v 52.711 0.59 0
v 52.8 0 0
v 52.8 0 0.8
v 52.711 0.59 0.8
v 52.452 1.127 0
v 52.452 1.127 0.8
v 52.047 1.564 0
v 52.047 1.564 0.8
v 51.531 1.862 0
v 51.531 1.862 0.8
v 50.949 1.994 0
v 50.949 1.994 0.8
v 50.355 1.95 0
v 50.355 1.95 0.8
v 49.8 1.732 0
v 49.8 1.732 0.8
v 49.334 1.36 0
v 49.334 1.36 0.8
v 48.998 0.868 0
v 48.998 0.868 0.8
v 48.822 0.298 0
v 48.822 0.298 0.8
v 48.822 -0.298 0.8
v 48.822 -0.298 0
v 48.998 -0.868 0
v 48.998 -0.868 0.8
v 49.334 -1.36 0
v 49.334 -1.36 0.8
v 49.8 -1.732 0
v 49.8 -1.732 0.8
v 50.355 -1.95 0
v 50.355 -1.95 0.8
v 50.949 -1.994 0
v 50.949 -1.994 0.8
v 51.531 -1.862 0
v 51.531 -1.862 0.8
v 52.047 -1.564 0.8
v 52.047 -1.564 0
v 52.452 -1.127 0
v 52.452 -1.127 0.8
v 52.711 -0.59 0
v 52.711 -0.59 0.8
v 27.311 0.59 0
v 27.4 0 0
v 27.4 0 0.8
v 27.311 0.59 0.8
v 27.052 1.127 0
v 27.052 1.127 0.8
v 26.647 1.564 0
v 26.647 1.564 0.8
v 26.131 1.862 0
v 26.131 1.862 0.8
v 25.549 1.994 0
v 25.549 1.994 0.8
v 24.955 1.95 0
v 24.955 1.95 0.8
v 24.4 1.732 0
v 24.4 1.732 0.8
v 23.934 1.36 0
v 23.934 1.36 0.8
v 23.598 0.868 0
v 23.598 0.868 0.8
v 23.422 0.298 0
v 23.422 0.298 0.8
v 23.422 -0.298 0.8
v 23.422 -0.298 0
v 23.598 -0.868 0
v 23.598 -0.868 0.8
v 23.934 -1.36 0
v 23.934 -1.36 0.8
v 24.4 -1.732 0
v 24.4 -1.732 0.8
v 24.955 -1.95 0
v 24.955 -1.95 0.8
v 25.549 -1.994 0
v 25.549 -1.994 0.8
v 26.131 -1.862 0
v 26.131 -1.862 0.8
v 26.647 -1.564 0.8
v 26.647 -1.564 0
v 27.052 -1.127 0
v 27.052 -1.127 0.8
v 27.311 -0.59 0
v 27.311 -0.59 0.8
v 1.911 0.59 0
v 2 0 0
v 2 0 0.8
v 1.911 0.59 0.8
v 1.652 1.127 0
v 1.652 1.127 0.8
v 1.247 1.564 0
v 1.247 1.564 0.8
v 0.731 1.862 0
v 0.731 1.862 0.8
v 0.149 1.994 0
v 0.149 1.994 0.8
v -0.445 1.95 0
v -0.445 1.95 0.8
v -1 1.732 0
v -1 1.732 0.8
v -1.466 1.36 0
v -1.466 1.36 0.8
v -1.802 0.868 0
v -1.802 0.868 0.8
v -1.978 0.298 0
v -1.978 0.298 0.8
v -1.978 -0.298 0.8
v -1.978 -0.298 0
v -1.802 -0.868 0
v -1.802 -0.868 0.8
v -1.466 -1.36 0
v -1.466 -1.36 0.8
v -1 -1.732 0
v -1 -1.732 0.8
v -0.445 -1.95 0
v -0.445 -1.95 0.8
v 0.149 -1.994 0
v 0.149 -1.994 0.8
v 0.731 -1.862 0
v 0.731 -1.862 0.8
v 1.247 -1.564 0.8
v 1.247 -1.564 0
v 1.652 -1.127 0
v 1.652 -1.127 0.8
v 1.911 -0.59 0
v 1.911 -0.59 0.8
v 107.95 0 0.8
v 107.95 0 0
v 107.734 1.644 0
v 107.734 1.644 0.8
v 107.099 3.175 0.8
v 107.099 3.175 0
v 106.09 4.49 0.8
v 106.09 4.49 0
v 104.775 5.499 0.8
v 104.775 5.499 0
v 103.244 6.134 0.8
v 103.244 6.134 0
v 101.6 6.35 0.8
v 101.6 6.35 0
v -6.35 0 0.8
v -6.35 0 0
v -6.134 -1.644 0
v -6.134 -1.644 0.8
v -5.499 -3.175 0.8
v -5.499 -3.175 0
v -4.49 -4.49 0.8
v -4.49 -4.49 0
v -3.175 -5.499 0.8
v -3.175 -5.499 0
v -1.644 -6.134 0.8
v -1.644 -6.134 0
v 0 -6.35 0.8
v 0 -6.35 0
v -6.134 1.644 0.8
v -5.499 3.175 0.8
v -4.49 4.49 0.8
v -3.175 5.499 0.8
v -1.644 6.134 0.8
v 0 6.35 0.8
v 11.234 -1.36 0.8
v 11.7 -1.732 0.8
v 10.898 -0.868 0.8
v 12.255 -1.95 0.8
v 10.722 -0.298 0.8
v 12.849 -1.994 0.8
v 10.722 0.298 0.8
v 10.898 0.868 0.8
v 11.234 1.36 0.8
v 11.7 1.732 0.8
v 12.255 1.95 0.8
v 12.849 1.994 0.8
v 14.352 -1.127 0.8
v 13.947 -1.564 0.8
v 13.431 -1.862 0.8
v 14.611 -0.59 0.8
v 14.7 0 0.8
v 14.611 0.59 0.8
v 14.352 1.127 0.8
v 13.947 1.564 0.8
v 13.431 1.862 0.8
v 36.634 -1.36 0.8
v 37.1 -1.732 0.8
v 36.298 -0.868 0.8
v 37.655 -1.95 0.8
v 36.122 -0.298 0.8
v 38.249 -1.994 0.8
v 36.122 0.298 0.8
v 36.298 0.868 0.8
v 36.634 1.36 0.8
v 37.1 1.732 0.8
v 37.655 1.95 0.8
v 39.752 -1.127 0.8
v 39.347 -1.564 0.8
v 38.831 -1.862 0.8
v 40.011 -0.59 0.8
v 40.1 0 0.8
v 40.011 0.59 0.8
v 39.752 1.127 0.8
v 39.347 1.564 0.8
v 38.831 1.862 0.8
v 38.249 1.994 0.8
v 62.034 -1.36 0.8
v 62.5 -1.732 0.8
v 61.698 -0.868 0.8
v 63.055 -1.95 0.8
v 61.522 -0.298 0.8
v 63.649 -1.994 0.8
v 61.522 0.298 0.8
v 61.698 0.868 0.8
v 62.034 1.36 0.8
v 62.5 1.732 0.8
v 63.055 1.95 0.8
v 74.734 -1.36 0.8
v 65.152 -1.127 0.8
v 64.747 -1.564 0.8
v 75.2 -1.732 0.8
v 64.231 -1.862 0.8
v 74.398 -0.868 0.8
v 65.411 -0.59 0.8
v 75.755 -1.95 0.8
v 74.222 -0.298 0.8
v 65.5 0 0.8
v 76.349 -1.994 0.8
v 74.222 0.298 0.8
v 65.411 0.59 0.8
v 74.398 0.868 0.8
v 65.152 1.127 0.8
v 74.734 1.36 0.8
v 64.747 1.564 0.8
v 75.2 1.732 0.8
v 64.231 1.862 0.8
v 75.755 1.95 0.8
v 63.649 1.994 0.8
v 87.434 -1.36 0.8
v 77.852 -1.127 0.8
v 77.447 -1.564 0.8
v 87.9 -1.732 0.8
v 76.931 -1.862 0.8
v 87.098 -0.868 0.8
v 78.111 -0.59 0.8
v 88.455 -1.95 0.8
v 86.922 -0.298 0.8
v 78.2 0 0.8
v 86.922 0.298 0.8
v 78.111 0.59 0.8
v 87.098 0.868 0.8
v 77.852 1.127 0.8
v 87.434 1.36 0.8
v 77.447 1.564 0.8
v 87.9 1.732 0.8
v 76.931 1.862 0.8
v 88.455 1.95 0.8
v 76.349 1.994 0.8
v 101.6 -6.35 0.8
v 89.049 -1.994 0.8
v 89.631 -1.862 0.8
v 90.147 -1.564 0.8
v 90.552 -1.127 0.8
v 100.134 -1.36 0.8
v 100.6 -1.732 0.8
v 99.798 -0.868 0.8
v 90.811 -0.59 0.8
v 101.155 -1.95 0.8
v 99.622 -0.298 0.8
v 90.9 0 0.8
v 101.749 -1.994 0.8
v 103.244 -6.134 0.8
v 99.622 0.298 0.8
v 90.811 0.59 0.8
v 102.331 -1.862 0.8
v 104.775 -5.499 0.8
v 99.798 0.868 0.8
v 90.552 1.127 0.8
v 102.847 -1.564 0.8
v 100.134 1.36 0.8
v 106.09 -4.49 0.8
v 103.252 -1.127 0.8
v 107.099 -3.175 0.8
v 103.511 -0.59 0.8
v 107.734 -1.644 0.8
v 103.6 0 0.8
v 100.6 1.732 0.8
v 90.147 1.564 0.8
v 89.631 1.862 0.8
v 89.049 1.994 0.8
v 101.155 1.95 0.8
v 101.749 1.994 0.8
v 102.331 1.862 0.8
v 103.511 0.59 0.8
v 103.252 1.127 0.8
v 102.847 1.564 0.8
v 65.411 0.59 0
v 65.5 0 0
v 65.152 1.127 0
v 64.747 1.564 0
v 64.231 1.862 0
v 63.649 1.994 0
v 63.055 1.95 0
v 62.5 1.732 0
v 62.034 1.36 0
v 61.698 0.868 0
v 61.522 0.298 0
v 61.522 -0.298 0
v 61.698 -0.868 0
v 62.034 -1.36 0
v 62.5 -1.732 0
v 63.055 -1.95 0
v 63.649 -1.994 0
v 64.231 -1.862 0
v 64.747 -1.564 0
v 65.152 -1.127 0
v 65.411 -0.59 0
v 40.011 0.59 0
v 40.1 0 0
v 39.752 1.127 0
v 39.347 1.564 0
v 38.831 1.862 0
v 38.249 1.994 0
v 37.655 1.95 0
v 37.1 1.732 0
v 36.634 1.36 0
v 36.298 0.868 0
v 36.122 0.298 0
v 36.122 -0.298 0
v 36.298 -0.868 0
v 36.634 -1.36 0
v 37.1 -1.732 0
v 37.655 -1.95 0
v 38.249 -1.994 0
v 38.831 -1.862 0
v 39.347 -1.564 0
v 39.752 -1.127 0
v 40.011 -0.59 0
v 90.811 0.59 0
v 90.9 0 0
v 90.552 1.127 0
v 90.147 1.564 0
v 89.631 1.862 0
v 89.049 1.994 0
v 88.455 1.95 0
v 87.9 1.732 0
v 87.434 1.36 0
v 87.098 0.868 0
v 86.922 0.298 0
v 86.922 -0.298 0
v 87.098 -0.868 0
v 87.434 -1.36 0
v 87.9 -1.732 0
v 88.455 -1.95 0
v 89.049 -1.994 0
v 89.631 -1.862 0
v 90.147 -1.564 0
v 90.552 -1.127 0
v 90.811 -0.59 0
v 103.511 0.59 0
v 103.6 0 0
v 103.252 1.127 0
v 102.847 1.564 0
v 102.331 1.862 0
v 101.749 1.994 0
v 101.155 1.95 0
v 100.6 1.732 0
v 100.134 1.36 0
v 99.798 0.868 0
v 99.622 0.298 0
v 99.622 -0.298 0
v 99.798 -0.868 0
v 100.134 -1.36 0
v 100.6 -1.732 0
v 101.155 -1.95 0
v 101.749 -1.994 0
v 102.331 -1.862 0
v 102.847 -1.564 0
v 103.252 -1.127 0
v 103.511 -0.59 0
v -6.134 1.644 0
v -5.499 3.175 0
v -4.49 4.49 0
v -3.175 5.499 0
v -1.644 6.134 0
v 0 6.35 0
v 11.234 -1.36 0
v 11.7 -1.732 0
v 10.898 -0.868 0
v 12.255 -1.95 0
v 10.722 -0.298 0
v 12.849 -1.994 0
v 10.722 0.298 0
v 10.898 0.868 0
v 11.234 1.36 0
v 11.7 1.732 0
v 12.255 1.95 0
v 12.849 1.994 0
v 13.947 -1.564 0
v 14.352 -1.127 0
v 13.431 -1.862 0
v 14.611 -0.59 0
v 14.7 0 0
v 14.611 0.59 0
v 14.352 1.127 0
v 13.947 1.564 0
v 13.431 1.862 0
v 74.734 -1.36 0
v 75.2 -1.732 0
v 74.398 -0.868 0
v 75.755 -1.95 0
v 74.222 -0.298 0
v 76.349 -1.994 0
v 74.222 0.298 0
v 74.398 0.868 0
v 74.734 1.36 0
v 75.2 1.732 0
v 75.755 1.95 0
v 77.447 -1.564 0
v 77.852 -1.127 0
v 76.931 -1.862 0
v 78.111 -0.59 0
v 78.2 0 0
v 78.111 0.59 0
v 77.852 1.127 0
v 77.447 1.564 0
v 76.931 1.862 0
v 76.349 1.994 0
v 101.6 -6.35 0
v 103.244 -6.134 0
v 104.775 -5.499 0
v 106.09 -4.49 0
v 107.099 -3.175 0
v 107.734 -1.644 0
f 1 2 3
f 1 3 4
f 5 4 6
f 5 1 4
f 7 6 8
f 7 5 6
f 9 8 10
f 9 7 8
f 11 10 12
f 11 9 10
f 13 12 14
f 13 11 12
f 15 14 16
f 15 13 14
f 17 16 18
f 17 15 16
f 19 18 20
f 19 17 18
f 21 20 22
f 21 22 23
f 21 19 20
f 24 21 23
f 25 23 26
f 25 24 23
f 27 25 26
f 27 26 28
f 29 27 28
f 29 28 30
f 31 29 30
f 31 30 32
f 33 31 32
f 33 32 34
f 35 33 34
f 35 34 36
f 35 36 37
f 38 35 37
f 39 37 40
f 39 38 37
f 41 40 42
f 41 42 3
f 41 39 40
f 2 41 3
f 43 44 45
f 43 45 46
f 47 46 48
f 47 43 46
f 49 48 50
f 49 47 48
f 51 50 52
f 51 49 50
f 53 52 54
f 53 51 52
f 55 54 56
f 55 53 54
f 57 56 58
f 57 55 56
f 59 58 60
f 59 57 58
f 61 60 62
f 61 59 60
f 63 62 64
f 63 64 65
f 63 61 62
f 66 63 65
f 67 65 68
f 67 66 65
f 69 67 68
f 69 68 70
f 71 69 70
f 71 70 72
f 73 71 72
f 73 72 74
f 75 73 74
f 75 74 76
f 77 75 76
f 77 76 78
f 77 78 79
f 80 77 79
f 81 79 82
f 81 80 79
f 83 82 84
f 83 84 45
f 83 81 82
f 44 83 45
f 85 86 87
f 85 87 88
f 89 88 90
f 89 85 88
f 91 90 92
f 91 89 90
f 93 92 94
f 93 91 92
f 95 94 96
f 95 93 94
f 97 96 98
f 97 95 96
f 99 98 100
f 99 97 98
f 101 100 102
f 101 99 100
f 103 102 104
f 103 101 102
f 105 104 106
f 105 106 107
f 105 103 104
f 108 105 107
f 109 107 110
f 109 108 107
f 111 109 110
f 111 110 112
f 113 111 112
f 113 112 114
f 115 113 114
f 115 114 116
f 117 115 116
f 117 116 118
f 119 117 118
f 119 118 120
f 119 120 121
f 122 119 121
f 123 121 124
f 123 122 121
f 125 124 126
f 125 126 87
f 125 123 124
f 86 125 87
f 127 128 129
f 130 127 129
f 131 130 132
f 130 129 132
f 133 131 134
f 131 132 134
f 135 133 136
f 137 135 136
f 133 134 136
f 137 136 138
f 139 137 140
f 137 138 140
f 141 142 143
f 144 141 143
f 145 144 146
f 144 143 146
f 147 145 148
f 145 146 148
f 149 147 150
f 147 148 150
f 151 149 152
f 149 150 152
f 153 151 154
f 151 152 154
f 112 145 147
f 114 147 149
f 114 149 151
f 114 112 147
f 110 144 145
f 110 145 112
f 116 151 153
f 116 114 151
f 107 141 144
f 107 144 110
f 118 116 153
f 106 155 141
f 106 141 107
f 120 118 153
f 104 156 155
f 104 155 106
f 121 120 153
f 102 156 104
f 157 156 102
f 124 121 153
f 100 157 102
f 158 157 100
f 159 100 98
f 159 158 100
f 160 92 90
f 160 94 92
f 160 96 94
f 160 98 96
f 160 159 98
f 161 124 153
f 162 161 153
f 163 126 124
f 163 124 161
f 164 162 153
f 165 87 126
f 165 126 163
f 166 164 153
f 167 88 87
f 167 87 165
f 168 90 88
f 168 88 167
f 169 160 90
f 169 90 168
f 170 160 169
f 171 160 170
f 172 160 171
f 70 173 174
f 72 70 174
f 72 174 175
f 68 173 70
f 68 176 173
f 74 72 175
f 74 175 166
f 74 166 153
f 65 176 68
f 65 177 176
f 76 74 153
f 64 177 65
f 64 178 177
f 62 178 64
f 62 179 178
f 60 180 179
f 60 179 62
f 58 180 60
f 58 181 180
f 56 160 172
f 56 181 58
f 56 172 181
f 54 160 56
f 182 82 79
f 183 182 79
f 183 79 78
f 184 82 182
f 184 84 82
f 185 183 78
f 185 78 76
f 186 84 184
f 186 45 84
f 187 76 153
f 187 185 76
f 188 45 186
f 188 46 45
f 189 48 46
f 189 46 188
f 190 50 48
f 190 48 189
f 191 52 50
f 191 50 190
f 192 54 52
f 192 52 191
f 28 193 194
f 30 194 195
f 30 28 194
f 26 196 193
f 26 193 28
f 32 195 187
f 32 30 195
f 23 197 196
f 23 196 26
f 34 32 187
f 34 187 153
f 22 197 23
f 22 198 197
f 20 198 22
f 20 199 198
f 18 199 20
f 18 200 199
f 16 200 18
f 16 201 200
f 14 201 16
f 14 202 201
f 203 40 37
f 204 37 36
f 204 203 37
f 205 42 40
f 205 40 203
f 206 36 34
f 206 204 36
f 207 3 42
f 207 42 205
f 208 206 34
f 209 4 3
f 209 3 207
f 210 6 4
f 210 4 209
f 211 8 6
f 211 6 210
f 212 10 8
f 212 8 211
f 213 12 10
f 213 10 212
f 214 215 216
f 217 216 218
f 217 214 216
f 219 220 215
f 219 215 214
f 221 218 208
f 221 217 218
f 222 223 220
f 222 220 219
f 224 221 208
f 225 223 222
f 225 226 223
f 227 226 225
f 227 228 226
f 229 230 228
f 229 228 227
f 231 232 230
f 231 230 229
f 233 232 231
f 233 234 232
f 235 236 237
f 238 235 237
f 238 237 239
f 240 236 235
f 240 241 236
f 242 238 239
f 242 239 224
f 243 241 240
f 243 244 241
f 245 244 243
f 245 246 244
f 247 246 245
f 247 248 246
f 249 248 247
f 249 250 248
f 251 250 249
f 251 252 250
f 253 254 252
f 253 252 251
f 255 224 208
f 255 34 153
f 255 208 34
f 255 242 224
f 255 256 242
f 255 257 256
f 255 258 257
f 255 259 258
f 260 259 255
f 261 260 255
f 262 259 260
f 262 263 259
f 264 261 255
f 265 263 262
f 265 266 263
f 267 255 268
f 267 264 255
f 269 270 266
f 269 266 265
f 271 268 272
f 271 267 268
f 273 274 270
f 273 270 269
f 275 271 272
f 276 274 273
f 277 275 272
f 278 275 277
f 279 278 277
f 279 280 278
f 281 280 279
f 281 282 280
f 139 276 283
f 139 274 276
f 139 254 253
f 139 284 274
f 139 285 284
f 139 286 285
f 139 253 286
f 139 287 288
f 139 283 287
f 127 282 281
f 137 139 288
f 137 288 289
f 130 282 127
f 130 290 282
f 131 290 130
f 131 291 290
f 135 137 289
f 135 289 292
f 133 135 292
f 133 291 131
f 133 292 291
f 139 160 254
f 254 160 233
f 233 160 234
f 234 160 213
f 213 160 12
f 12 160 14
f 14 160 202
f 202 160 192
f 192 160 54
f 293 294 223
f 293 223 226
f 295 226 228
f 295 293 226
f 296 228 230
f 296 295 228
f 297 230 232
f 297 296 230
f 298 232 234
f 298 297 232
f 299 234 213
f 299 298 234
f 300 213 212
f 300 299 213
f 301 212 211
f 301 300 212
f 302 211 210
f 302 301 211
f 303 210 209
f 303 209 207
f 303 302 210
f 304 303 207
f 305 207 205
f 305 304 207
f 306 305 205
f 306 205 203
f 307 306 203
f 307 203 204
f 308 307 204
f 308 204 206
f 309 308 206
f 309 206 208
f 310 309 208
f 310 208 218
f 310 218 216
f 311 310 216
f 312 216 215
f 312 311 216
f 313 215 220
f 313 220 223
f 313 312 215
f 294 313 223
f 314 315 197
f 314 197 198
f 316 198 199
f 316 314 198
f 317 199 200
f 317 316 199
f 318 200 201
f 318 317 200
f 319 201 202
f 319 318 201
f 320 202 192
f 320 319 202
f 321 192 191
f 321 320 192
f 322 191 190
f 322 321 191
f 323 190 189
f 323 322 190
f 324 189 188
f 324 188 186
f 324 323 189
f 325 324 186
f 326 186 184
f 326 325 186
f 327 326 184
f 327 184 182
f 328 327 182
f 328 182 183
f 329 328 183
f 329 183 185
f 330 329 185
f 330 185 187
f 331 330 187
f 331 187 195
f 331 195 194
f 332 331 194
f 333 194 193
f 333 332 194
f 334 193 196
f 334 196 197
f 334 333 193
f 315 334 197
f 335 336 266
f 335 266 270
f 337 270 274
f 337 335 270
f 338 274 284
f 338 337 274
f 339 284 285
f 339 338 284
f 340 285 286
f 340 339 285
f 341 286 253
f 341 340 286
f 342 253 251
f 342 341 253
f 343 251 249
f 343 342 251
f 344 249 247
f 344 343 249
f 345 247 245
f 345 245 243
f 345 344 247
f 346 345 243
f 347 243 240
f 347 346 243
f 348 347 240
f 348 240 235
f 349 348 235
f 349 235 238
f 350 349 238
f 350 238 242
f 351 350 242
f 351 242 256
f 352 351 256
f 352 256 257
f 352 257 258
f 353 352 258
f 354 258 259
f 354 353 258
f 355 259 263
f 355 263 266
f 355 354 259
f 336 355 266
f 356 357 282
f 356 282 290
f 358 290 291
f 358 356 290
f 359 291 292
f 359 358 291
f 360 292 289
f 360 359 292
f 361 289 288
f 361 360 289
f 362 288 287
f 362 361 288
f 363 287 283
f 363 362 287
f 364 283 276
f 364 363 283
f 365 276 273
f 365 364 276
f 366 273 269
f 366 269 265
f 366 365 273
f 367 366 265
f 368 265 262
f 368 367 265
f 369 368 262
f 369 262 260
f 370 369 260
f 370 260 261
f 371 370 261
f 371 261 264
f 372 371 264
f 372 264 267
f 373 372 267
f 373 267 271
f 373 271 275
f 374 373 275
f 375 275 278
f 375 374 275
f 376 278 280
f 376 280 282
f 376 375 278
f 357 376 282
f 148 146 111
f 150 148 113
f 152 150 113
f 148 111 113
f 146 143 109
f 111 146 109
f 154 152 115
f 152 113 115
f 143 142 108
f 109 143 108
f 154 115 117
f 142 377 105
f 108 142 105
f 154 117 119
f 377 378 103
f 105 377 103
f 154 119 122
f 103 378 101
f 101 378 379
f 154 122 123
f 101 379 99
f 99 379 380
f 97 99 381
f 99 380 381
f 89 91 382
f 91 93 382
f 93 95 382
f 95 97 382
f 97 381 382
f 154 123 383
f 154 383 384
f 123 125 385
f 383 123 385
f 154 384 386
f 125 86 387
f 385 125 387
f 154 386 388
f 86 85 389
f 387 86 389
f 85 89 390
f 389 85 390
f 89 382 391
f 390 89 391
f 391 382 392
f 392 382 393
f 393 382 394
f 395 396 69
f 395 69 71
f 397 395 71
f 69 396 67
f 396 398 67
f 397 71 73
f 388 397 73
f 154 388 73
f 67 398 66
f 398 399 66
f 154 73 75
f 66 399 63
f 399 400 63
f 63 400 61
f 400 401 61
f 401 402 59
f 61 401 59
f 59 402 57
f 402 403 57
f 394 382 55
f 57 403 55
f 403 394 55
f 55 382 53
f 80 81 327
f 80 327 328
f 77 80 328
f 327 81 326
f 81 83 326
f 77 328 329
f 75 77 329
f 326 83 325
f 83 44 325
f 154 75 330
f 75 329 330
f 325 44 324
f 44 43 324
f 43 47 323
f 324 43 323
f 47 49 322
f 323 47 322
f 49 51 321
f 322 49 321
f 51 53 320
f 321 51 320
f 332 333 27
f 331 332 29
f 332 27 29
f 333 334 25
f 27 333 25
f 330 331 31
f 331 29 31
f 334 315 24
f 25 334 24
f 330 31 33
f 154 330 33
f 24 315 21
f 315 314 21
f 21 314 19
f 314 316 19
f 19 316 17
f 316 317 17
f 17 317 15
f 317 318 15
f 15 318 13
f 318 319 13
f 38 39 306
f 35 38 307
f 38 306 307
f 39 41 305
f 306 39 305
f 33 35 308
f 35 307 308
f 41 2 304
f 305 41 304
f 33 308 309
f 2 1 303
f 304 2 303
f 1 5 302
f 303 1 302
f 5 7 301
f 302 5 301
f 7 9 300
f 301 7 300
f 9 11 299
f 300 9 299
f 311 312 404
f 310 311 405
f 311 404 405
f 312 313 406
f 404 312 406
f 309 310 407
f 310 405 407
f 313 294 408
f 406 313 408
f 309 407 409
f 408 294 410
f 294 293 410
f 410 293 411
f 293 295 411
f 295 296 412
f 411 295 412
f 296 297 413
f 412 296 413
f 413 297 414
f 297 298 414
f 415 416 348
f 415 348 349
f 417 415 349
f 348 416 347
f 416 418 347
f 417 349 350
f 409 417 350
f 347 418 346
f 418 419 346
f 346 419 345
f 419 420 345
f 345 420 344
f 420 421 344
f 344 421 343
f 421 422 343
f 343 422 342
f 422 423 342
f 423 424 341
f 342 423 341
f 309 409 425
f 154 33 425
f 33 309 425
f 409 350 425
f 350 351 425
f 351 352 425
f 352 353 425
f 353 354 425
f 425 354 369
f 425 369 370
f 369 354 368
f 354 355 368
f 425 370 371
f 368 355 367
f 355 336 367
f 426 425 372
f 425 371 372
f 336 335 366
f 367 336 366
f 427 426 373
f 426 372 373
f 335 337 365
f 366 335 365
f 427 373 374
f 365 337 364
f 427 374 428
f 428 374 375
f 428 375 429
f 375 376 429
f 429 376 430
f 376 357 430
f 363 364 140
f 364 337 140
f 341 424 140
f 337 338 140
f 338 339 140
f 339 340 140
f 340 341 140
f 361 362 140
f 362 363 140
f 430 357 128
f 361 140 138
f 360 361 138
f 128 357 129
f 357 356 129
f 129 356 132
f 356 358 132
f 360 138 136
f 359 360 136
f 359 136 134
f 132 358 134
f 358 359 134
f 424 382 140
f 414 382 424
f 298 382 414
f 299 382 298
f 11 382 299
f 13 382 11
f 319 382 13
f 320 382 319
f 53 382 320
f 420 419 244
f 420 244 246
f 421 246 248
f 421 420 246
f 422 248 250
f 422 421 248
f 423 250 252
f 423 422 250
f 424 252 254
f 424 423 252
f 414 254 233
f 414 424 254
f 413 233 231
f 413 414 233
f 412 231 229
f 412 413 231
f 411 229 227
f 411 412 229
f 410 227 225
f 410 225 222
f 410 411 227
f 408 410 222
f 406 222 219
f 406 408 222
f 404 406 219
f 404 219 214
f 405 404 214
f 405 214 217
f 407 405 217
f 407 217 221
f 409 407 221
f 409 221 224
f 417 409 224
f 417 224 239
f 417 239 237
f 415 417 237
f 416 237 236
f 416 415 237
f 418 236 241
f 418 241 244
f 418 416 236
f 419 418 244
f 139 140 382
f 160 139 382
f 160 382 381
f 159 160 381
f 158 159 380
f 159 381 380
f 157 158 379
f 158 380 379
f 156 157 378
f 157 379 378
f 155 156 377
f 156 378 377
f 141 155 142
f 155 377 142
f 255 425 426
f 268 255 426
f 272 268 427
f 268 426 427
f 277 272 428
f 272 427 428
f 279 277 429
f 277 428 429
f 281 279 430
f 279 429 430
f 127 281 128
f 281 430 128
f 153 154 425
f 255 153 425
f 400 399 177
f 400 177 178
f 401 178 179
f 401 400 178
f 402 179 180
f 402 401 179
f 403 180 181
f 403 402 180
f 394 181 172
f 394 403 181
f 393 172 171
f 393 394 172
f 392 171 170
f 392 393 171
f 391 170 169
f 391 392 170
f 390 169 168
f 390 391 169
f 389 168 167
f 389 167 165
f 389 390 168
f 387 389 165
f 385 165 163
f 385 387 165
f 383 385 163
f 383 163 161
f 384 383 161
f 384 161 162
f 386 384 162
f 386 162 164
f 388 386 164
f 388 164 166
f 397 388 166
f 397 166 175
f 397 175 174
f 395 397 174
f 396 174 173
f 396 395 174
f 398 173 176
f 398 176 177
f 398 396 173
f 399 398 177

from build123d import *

# Parameters (mm, degrees)
F0_R     = 2
F1_DEPTH = 0.8


with BuildPart() as f1:
    # F0 (on Top) → F1 (new body)
    with BuildSketch(Plane.XY):
        with BuildLine():
            Line((0, -6.35), (101.6, -6.35))
            ThreePointArc((101.6, -6.35), (106.090128, -4.490128), (107.95, 0))
            ThreePointArc((107.95, 0), (106.090128, 4.490128), (101.6, 6.35))
            Line((101.6, 6.35), (0, 6.35))
            ThreePointArc((0, 6.35), (-4.490128, 4.490128), (-6.35, 0))
            ThreePointArc((-6.35, 0), (-4.490128, -4.490128), (0, -6.35))
        make_face()
        Circle(F0_R, mode=Mode.SUBTRACT)
        with Locations((12.7, 0)):
            Circle(F0_R, mode=Mode.SUBTRACT)
        with Locations((25.4, 0)):
            Circle(F0_R, mode=Mode.SUBTRACT)
        with Locations((38.1, 0)):
            Circle(F0_R, mode=Mode.SUBTRACT)
        with Locations((50.8, 0)):
            Circle(F0_R, mode=Mode.SUBTRACT)
        with Locations((63.5, 0)):
            Circle(F0_R, mode=Mode.SUBTRACT)
        with Locations((76.2, 0)):
            Circle(F0_R, mode=Mode.SUBTRACT)
        with Locations((88.9, 0)):
            Circle(F0_R, mode=Mode.SUBTRACT)
        with Locations((101.6, 0)):
            Circle(F0_R, mode=Mode.SUBTRACT)
    extrude(amount=F1_DEPTH)


solid = f1.part
